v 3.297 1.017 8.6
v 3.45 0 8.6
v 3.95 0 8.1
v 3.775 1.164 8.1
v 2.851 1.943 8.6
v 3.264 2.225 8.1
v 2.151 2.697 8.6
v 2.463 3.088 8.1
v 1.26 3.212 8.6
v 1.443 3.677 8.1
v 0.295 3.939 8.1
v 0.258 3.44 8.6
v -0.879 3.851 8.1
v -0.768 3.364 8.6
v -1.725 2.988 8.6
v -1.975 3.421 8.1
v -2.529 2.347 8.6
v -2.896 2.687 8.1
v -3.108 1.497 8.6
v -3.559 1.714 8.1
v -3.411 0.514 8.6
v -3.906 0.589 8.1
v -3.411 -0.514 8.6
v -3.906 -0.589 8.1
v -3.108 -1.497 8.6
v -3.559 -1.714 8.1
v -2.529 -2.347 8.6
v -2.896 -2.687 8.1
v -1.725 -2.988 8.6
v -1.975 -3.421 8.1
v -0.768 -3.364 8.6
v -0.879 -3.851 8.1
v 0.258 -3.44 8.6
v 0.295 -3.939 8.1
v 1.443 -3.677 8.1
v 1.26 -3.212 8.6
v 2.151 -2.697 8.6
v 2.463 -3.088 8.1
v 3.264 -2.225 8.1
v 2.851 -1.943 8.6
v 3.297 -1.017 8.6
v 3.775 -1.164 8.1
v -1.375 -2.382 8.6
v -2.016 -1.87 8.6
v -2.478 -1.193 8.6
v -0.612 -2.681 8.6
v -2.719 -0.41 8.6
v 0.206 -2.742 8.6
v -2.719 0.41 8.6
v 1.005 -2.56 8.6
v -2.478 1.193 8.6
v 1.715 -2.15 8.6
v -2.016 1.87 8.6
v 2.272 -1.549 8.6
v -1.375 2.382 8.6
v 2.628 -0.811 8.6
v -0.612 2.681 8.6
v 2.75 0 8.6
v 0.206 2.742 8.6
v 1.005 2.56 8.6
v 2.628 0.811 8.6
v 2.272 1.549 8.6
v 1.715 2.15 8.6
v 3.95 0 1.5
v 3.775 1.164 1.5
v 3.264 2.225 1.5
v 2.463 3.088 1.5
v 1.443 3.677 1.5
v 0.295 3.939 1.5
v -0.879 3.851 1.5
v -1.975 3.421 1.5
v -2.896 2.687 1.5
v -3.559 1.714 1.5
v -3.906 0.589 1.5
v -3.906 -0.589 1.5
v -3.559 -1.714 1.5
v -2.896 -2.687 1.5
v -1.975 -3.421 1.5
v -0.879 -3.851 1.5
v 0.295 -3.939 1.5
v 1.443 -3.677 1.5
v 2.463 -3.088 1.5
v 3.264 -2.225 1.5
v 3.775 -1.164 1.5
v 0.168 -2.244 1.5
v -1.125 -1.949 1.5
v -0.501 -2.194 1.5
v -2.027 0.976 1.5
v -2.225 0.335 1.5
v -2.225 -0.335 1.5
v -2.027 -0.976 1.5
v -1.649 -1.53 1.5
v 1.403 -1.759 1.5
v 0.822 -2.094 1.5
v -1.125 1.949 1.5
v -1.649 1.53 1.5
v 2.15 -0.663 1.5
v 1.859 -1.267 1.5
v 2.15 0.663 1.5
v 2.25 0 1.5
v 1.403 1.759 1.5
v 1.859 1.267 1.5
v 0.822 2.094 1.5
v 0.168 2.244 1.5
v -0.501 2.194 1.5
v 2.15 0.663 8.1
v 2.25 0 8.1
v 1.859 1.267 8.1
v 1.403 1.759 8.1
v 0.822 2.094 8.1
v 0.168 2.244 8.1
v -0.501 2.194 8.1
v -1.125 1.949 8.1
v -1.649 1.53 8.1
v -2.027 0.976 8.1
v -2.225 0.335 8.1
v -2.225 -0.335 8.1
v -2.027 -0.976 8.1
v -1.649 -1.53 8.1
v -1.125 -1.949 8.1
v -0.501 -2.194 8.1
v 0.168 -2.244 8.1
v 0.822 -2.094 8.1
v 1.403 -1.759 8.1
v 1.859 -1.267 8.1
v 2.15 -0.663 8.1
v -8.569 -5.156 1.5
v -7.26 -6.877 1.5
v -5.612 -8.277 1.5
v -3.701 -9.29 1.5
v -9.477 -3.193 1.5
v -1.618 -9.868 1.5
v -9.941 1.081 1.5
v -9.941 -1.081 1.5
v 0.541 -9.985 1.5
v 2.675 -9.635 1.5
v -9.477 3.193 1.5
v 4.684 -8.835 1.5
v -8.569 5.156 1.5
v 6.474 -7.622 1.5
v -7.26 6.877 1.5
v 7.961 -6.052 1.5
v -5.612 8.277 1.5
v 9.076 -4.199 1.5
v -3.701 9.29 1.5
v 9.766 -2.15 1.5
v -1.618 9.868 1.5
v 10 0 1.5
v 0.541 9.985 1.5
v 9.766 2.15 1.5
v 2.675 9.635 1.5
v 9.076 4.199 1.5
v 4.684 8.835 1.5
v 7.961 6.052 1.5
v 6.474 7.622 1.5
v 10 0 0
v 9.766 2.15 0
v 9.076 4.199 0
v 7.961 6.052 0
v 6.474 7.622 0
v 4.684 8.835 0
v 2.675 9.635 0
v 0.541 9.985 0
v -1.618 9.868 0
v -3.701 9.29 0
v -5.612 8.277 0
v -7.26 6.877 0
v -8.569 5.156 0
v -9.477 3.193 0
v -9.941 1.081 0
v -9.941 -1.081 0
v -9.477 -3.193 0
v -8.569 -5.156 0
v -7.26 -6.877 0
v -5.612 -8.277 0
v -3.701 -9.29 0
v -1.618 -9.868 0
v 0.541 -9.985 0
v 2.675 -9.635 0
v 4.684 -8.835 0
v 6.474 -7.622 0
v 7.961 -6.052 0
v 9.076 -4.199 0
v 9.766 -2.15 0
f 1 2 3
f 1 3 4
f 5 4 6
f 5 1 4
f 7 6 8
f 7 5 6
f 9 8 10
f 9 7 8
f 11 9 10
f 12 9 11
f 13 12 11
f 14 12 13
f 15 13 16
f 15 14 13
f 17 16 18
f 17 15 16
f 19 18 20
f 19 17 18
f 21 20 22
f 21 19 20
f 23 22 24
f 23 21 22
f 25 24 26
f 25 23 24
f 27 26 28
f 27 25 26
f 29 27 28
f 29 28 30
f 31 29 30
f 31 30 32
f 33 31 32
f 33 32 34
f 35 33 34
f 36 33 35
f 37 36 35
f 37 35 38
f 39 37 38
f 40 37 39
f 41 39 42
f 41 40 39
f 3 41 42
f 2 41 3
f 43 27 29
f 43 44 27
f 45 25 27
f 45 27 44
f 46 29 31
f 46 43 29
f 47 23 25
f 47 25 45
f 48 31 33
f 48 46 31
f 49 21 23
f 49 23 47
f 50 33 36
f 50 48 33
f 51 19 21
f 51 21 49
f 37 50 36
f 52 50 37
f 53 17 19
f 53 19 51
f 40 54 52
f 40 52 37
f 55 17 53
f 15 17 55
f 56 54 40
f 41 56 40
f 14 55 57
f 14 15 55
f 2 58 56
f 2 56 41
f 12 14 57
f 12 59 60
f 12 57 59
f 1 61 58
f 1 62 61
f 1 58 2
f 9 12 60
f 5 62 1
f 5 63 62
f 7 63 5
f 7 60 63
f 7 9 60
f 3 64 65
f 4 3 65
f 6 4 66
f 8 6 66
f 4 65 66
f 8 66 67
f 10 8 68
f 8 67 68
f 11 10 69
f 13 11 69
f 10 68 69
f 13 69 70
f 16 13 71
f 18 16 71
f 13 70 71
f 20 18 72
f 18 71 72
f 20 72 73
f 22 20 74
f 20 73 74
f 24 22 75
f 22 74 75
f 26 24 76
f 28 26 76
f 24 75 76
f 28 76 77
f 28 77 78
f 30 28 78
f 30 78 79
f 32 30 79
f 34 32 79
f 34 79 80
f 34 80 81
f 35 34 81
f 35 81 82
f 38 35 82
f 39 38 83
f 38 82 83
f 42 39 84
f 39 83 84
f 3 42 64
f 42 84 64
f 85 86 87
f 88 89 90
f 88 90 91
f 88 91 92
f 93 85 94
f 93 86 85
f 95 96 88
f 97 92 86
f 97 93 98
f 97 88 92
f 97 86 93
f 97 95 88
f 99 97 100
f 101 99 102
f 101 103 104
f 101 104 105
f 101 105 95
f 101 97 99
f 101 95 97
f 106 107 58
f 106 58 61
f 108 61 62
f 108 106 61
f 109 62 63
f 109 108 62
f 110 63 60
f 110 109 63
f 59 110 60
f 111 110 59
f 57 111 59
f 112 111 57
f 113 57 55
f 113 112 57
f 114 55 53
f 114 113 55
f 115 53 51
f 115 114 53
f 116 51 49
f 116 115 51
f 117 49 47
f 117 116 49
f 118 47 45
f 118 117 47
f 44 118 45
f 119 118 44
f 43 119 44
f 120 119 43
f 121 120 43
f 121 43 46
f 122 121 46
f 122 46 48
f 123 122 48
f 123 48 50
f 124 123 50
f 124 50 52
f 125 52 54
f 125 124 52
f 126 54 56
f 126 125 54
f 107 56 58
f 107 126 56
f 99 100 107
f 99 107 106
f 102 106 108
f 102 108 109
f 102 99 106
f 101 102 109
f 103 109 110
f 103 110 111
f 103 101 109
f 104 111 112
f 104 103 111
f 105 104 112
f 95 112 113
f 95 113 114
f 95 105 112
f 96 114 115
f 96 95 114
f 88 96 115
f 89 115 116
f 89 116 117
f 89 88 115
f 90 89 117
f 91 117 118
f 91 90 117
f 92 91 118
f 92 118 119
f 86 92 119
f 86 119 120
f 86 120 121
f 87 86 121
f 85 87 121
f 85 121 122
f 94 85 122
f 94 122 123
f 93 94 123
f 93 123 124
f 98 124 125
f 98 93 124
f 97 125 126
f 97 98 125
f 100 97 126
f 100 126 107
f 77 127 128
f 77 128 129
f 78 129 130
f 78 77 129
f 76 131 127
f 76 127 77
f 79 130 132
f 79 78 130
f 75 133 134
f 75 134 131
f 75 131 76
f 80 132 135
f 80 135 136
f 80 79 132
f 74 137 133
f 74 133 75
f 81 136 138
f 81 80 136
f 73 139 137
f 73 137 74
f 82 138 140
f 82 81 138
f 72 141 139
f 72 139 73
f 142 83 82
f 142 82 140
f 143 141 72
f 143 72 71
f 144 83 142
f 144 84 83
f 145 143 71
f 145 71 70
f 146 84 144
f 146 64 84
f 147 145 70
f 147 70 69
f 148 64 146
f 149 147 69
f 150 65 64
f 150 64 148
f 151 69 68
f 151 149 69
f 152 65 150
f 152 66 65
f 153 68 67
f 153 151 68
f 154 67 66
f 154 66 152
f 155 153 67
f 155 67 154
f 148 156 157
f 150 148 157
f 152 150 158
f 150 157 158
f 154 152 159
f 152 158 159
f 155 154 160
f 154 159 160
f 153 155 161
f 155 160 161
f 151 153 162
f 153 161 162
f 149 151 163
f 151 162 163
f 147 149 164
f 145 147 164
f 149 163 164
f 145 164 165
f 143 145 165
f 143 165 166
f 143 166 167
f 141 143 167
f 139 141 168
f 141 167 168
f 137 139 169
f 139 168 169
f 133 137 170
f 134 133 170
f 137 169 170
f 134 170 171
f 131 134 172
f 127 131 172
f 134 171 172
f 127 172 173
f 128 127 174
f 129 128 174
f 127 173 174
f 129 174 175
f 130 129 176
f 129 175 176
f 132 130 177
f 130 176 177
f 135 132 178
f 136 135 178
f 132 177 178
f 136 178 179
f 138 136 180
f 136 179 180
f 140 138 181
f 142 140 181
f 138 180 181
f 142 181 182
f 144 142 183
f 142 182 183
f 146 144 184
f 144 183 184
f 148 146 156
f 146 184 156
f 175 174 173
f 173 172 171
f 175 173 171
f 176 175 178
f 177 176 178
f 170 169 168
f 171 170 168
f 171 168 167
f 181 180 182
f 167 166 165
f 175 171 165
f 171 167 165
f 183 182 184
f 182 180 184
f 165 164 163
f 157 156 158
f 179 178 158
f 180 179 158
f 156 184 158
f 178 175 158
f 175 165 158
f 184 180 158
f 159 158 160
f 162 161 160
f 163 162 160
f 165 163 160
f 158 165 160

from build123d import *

# Parameters (mm, degrees)
F0_R     = 10
F1_DEPTH = 1.5
F2_R     = 3.95
F2_R_2   = 2.25
F3_DEPTH = 7.1
F4_SIZE  = 0.5


with BuildPart() as f1:
    # F0 (on Top) → F1 (new body)
    with BuildSketch(Plane.XY):
        Circle(F0_R)
    extrude(amount=F1_DEPTH)

    # F2 (on face) → F3 (join)
    with BuildSketch(Plane.XY.offset(1.5)):
        Circle(F2_R)
        Circle(F2_R_2, mode=Mode.SUBTRACT)
    extrude(amount=F3_DEPTH)

    # F4
    f4_edges = [f1.edges().sort_by_distance(p)[0] for p in [
        (-3.95, 0, 8.6),
        (-2.25, 0, 8.6),
    ]]
    chamfer(f4_edges, length=F4_SIZE)


solid = f1.part
